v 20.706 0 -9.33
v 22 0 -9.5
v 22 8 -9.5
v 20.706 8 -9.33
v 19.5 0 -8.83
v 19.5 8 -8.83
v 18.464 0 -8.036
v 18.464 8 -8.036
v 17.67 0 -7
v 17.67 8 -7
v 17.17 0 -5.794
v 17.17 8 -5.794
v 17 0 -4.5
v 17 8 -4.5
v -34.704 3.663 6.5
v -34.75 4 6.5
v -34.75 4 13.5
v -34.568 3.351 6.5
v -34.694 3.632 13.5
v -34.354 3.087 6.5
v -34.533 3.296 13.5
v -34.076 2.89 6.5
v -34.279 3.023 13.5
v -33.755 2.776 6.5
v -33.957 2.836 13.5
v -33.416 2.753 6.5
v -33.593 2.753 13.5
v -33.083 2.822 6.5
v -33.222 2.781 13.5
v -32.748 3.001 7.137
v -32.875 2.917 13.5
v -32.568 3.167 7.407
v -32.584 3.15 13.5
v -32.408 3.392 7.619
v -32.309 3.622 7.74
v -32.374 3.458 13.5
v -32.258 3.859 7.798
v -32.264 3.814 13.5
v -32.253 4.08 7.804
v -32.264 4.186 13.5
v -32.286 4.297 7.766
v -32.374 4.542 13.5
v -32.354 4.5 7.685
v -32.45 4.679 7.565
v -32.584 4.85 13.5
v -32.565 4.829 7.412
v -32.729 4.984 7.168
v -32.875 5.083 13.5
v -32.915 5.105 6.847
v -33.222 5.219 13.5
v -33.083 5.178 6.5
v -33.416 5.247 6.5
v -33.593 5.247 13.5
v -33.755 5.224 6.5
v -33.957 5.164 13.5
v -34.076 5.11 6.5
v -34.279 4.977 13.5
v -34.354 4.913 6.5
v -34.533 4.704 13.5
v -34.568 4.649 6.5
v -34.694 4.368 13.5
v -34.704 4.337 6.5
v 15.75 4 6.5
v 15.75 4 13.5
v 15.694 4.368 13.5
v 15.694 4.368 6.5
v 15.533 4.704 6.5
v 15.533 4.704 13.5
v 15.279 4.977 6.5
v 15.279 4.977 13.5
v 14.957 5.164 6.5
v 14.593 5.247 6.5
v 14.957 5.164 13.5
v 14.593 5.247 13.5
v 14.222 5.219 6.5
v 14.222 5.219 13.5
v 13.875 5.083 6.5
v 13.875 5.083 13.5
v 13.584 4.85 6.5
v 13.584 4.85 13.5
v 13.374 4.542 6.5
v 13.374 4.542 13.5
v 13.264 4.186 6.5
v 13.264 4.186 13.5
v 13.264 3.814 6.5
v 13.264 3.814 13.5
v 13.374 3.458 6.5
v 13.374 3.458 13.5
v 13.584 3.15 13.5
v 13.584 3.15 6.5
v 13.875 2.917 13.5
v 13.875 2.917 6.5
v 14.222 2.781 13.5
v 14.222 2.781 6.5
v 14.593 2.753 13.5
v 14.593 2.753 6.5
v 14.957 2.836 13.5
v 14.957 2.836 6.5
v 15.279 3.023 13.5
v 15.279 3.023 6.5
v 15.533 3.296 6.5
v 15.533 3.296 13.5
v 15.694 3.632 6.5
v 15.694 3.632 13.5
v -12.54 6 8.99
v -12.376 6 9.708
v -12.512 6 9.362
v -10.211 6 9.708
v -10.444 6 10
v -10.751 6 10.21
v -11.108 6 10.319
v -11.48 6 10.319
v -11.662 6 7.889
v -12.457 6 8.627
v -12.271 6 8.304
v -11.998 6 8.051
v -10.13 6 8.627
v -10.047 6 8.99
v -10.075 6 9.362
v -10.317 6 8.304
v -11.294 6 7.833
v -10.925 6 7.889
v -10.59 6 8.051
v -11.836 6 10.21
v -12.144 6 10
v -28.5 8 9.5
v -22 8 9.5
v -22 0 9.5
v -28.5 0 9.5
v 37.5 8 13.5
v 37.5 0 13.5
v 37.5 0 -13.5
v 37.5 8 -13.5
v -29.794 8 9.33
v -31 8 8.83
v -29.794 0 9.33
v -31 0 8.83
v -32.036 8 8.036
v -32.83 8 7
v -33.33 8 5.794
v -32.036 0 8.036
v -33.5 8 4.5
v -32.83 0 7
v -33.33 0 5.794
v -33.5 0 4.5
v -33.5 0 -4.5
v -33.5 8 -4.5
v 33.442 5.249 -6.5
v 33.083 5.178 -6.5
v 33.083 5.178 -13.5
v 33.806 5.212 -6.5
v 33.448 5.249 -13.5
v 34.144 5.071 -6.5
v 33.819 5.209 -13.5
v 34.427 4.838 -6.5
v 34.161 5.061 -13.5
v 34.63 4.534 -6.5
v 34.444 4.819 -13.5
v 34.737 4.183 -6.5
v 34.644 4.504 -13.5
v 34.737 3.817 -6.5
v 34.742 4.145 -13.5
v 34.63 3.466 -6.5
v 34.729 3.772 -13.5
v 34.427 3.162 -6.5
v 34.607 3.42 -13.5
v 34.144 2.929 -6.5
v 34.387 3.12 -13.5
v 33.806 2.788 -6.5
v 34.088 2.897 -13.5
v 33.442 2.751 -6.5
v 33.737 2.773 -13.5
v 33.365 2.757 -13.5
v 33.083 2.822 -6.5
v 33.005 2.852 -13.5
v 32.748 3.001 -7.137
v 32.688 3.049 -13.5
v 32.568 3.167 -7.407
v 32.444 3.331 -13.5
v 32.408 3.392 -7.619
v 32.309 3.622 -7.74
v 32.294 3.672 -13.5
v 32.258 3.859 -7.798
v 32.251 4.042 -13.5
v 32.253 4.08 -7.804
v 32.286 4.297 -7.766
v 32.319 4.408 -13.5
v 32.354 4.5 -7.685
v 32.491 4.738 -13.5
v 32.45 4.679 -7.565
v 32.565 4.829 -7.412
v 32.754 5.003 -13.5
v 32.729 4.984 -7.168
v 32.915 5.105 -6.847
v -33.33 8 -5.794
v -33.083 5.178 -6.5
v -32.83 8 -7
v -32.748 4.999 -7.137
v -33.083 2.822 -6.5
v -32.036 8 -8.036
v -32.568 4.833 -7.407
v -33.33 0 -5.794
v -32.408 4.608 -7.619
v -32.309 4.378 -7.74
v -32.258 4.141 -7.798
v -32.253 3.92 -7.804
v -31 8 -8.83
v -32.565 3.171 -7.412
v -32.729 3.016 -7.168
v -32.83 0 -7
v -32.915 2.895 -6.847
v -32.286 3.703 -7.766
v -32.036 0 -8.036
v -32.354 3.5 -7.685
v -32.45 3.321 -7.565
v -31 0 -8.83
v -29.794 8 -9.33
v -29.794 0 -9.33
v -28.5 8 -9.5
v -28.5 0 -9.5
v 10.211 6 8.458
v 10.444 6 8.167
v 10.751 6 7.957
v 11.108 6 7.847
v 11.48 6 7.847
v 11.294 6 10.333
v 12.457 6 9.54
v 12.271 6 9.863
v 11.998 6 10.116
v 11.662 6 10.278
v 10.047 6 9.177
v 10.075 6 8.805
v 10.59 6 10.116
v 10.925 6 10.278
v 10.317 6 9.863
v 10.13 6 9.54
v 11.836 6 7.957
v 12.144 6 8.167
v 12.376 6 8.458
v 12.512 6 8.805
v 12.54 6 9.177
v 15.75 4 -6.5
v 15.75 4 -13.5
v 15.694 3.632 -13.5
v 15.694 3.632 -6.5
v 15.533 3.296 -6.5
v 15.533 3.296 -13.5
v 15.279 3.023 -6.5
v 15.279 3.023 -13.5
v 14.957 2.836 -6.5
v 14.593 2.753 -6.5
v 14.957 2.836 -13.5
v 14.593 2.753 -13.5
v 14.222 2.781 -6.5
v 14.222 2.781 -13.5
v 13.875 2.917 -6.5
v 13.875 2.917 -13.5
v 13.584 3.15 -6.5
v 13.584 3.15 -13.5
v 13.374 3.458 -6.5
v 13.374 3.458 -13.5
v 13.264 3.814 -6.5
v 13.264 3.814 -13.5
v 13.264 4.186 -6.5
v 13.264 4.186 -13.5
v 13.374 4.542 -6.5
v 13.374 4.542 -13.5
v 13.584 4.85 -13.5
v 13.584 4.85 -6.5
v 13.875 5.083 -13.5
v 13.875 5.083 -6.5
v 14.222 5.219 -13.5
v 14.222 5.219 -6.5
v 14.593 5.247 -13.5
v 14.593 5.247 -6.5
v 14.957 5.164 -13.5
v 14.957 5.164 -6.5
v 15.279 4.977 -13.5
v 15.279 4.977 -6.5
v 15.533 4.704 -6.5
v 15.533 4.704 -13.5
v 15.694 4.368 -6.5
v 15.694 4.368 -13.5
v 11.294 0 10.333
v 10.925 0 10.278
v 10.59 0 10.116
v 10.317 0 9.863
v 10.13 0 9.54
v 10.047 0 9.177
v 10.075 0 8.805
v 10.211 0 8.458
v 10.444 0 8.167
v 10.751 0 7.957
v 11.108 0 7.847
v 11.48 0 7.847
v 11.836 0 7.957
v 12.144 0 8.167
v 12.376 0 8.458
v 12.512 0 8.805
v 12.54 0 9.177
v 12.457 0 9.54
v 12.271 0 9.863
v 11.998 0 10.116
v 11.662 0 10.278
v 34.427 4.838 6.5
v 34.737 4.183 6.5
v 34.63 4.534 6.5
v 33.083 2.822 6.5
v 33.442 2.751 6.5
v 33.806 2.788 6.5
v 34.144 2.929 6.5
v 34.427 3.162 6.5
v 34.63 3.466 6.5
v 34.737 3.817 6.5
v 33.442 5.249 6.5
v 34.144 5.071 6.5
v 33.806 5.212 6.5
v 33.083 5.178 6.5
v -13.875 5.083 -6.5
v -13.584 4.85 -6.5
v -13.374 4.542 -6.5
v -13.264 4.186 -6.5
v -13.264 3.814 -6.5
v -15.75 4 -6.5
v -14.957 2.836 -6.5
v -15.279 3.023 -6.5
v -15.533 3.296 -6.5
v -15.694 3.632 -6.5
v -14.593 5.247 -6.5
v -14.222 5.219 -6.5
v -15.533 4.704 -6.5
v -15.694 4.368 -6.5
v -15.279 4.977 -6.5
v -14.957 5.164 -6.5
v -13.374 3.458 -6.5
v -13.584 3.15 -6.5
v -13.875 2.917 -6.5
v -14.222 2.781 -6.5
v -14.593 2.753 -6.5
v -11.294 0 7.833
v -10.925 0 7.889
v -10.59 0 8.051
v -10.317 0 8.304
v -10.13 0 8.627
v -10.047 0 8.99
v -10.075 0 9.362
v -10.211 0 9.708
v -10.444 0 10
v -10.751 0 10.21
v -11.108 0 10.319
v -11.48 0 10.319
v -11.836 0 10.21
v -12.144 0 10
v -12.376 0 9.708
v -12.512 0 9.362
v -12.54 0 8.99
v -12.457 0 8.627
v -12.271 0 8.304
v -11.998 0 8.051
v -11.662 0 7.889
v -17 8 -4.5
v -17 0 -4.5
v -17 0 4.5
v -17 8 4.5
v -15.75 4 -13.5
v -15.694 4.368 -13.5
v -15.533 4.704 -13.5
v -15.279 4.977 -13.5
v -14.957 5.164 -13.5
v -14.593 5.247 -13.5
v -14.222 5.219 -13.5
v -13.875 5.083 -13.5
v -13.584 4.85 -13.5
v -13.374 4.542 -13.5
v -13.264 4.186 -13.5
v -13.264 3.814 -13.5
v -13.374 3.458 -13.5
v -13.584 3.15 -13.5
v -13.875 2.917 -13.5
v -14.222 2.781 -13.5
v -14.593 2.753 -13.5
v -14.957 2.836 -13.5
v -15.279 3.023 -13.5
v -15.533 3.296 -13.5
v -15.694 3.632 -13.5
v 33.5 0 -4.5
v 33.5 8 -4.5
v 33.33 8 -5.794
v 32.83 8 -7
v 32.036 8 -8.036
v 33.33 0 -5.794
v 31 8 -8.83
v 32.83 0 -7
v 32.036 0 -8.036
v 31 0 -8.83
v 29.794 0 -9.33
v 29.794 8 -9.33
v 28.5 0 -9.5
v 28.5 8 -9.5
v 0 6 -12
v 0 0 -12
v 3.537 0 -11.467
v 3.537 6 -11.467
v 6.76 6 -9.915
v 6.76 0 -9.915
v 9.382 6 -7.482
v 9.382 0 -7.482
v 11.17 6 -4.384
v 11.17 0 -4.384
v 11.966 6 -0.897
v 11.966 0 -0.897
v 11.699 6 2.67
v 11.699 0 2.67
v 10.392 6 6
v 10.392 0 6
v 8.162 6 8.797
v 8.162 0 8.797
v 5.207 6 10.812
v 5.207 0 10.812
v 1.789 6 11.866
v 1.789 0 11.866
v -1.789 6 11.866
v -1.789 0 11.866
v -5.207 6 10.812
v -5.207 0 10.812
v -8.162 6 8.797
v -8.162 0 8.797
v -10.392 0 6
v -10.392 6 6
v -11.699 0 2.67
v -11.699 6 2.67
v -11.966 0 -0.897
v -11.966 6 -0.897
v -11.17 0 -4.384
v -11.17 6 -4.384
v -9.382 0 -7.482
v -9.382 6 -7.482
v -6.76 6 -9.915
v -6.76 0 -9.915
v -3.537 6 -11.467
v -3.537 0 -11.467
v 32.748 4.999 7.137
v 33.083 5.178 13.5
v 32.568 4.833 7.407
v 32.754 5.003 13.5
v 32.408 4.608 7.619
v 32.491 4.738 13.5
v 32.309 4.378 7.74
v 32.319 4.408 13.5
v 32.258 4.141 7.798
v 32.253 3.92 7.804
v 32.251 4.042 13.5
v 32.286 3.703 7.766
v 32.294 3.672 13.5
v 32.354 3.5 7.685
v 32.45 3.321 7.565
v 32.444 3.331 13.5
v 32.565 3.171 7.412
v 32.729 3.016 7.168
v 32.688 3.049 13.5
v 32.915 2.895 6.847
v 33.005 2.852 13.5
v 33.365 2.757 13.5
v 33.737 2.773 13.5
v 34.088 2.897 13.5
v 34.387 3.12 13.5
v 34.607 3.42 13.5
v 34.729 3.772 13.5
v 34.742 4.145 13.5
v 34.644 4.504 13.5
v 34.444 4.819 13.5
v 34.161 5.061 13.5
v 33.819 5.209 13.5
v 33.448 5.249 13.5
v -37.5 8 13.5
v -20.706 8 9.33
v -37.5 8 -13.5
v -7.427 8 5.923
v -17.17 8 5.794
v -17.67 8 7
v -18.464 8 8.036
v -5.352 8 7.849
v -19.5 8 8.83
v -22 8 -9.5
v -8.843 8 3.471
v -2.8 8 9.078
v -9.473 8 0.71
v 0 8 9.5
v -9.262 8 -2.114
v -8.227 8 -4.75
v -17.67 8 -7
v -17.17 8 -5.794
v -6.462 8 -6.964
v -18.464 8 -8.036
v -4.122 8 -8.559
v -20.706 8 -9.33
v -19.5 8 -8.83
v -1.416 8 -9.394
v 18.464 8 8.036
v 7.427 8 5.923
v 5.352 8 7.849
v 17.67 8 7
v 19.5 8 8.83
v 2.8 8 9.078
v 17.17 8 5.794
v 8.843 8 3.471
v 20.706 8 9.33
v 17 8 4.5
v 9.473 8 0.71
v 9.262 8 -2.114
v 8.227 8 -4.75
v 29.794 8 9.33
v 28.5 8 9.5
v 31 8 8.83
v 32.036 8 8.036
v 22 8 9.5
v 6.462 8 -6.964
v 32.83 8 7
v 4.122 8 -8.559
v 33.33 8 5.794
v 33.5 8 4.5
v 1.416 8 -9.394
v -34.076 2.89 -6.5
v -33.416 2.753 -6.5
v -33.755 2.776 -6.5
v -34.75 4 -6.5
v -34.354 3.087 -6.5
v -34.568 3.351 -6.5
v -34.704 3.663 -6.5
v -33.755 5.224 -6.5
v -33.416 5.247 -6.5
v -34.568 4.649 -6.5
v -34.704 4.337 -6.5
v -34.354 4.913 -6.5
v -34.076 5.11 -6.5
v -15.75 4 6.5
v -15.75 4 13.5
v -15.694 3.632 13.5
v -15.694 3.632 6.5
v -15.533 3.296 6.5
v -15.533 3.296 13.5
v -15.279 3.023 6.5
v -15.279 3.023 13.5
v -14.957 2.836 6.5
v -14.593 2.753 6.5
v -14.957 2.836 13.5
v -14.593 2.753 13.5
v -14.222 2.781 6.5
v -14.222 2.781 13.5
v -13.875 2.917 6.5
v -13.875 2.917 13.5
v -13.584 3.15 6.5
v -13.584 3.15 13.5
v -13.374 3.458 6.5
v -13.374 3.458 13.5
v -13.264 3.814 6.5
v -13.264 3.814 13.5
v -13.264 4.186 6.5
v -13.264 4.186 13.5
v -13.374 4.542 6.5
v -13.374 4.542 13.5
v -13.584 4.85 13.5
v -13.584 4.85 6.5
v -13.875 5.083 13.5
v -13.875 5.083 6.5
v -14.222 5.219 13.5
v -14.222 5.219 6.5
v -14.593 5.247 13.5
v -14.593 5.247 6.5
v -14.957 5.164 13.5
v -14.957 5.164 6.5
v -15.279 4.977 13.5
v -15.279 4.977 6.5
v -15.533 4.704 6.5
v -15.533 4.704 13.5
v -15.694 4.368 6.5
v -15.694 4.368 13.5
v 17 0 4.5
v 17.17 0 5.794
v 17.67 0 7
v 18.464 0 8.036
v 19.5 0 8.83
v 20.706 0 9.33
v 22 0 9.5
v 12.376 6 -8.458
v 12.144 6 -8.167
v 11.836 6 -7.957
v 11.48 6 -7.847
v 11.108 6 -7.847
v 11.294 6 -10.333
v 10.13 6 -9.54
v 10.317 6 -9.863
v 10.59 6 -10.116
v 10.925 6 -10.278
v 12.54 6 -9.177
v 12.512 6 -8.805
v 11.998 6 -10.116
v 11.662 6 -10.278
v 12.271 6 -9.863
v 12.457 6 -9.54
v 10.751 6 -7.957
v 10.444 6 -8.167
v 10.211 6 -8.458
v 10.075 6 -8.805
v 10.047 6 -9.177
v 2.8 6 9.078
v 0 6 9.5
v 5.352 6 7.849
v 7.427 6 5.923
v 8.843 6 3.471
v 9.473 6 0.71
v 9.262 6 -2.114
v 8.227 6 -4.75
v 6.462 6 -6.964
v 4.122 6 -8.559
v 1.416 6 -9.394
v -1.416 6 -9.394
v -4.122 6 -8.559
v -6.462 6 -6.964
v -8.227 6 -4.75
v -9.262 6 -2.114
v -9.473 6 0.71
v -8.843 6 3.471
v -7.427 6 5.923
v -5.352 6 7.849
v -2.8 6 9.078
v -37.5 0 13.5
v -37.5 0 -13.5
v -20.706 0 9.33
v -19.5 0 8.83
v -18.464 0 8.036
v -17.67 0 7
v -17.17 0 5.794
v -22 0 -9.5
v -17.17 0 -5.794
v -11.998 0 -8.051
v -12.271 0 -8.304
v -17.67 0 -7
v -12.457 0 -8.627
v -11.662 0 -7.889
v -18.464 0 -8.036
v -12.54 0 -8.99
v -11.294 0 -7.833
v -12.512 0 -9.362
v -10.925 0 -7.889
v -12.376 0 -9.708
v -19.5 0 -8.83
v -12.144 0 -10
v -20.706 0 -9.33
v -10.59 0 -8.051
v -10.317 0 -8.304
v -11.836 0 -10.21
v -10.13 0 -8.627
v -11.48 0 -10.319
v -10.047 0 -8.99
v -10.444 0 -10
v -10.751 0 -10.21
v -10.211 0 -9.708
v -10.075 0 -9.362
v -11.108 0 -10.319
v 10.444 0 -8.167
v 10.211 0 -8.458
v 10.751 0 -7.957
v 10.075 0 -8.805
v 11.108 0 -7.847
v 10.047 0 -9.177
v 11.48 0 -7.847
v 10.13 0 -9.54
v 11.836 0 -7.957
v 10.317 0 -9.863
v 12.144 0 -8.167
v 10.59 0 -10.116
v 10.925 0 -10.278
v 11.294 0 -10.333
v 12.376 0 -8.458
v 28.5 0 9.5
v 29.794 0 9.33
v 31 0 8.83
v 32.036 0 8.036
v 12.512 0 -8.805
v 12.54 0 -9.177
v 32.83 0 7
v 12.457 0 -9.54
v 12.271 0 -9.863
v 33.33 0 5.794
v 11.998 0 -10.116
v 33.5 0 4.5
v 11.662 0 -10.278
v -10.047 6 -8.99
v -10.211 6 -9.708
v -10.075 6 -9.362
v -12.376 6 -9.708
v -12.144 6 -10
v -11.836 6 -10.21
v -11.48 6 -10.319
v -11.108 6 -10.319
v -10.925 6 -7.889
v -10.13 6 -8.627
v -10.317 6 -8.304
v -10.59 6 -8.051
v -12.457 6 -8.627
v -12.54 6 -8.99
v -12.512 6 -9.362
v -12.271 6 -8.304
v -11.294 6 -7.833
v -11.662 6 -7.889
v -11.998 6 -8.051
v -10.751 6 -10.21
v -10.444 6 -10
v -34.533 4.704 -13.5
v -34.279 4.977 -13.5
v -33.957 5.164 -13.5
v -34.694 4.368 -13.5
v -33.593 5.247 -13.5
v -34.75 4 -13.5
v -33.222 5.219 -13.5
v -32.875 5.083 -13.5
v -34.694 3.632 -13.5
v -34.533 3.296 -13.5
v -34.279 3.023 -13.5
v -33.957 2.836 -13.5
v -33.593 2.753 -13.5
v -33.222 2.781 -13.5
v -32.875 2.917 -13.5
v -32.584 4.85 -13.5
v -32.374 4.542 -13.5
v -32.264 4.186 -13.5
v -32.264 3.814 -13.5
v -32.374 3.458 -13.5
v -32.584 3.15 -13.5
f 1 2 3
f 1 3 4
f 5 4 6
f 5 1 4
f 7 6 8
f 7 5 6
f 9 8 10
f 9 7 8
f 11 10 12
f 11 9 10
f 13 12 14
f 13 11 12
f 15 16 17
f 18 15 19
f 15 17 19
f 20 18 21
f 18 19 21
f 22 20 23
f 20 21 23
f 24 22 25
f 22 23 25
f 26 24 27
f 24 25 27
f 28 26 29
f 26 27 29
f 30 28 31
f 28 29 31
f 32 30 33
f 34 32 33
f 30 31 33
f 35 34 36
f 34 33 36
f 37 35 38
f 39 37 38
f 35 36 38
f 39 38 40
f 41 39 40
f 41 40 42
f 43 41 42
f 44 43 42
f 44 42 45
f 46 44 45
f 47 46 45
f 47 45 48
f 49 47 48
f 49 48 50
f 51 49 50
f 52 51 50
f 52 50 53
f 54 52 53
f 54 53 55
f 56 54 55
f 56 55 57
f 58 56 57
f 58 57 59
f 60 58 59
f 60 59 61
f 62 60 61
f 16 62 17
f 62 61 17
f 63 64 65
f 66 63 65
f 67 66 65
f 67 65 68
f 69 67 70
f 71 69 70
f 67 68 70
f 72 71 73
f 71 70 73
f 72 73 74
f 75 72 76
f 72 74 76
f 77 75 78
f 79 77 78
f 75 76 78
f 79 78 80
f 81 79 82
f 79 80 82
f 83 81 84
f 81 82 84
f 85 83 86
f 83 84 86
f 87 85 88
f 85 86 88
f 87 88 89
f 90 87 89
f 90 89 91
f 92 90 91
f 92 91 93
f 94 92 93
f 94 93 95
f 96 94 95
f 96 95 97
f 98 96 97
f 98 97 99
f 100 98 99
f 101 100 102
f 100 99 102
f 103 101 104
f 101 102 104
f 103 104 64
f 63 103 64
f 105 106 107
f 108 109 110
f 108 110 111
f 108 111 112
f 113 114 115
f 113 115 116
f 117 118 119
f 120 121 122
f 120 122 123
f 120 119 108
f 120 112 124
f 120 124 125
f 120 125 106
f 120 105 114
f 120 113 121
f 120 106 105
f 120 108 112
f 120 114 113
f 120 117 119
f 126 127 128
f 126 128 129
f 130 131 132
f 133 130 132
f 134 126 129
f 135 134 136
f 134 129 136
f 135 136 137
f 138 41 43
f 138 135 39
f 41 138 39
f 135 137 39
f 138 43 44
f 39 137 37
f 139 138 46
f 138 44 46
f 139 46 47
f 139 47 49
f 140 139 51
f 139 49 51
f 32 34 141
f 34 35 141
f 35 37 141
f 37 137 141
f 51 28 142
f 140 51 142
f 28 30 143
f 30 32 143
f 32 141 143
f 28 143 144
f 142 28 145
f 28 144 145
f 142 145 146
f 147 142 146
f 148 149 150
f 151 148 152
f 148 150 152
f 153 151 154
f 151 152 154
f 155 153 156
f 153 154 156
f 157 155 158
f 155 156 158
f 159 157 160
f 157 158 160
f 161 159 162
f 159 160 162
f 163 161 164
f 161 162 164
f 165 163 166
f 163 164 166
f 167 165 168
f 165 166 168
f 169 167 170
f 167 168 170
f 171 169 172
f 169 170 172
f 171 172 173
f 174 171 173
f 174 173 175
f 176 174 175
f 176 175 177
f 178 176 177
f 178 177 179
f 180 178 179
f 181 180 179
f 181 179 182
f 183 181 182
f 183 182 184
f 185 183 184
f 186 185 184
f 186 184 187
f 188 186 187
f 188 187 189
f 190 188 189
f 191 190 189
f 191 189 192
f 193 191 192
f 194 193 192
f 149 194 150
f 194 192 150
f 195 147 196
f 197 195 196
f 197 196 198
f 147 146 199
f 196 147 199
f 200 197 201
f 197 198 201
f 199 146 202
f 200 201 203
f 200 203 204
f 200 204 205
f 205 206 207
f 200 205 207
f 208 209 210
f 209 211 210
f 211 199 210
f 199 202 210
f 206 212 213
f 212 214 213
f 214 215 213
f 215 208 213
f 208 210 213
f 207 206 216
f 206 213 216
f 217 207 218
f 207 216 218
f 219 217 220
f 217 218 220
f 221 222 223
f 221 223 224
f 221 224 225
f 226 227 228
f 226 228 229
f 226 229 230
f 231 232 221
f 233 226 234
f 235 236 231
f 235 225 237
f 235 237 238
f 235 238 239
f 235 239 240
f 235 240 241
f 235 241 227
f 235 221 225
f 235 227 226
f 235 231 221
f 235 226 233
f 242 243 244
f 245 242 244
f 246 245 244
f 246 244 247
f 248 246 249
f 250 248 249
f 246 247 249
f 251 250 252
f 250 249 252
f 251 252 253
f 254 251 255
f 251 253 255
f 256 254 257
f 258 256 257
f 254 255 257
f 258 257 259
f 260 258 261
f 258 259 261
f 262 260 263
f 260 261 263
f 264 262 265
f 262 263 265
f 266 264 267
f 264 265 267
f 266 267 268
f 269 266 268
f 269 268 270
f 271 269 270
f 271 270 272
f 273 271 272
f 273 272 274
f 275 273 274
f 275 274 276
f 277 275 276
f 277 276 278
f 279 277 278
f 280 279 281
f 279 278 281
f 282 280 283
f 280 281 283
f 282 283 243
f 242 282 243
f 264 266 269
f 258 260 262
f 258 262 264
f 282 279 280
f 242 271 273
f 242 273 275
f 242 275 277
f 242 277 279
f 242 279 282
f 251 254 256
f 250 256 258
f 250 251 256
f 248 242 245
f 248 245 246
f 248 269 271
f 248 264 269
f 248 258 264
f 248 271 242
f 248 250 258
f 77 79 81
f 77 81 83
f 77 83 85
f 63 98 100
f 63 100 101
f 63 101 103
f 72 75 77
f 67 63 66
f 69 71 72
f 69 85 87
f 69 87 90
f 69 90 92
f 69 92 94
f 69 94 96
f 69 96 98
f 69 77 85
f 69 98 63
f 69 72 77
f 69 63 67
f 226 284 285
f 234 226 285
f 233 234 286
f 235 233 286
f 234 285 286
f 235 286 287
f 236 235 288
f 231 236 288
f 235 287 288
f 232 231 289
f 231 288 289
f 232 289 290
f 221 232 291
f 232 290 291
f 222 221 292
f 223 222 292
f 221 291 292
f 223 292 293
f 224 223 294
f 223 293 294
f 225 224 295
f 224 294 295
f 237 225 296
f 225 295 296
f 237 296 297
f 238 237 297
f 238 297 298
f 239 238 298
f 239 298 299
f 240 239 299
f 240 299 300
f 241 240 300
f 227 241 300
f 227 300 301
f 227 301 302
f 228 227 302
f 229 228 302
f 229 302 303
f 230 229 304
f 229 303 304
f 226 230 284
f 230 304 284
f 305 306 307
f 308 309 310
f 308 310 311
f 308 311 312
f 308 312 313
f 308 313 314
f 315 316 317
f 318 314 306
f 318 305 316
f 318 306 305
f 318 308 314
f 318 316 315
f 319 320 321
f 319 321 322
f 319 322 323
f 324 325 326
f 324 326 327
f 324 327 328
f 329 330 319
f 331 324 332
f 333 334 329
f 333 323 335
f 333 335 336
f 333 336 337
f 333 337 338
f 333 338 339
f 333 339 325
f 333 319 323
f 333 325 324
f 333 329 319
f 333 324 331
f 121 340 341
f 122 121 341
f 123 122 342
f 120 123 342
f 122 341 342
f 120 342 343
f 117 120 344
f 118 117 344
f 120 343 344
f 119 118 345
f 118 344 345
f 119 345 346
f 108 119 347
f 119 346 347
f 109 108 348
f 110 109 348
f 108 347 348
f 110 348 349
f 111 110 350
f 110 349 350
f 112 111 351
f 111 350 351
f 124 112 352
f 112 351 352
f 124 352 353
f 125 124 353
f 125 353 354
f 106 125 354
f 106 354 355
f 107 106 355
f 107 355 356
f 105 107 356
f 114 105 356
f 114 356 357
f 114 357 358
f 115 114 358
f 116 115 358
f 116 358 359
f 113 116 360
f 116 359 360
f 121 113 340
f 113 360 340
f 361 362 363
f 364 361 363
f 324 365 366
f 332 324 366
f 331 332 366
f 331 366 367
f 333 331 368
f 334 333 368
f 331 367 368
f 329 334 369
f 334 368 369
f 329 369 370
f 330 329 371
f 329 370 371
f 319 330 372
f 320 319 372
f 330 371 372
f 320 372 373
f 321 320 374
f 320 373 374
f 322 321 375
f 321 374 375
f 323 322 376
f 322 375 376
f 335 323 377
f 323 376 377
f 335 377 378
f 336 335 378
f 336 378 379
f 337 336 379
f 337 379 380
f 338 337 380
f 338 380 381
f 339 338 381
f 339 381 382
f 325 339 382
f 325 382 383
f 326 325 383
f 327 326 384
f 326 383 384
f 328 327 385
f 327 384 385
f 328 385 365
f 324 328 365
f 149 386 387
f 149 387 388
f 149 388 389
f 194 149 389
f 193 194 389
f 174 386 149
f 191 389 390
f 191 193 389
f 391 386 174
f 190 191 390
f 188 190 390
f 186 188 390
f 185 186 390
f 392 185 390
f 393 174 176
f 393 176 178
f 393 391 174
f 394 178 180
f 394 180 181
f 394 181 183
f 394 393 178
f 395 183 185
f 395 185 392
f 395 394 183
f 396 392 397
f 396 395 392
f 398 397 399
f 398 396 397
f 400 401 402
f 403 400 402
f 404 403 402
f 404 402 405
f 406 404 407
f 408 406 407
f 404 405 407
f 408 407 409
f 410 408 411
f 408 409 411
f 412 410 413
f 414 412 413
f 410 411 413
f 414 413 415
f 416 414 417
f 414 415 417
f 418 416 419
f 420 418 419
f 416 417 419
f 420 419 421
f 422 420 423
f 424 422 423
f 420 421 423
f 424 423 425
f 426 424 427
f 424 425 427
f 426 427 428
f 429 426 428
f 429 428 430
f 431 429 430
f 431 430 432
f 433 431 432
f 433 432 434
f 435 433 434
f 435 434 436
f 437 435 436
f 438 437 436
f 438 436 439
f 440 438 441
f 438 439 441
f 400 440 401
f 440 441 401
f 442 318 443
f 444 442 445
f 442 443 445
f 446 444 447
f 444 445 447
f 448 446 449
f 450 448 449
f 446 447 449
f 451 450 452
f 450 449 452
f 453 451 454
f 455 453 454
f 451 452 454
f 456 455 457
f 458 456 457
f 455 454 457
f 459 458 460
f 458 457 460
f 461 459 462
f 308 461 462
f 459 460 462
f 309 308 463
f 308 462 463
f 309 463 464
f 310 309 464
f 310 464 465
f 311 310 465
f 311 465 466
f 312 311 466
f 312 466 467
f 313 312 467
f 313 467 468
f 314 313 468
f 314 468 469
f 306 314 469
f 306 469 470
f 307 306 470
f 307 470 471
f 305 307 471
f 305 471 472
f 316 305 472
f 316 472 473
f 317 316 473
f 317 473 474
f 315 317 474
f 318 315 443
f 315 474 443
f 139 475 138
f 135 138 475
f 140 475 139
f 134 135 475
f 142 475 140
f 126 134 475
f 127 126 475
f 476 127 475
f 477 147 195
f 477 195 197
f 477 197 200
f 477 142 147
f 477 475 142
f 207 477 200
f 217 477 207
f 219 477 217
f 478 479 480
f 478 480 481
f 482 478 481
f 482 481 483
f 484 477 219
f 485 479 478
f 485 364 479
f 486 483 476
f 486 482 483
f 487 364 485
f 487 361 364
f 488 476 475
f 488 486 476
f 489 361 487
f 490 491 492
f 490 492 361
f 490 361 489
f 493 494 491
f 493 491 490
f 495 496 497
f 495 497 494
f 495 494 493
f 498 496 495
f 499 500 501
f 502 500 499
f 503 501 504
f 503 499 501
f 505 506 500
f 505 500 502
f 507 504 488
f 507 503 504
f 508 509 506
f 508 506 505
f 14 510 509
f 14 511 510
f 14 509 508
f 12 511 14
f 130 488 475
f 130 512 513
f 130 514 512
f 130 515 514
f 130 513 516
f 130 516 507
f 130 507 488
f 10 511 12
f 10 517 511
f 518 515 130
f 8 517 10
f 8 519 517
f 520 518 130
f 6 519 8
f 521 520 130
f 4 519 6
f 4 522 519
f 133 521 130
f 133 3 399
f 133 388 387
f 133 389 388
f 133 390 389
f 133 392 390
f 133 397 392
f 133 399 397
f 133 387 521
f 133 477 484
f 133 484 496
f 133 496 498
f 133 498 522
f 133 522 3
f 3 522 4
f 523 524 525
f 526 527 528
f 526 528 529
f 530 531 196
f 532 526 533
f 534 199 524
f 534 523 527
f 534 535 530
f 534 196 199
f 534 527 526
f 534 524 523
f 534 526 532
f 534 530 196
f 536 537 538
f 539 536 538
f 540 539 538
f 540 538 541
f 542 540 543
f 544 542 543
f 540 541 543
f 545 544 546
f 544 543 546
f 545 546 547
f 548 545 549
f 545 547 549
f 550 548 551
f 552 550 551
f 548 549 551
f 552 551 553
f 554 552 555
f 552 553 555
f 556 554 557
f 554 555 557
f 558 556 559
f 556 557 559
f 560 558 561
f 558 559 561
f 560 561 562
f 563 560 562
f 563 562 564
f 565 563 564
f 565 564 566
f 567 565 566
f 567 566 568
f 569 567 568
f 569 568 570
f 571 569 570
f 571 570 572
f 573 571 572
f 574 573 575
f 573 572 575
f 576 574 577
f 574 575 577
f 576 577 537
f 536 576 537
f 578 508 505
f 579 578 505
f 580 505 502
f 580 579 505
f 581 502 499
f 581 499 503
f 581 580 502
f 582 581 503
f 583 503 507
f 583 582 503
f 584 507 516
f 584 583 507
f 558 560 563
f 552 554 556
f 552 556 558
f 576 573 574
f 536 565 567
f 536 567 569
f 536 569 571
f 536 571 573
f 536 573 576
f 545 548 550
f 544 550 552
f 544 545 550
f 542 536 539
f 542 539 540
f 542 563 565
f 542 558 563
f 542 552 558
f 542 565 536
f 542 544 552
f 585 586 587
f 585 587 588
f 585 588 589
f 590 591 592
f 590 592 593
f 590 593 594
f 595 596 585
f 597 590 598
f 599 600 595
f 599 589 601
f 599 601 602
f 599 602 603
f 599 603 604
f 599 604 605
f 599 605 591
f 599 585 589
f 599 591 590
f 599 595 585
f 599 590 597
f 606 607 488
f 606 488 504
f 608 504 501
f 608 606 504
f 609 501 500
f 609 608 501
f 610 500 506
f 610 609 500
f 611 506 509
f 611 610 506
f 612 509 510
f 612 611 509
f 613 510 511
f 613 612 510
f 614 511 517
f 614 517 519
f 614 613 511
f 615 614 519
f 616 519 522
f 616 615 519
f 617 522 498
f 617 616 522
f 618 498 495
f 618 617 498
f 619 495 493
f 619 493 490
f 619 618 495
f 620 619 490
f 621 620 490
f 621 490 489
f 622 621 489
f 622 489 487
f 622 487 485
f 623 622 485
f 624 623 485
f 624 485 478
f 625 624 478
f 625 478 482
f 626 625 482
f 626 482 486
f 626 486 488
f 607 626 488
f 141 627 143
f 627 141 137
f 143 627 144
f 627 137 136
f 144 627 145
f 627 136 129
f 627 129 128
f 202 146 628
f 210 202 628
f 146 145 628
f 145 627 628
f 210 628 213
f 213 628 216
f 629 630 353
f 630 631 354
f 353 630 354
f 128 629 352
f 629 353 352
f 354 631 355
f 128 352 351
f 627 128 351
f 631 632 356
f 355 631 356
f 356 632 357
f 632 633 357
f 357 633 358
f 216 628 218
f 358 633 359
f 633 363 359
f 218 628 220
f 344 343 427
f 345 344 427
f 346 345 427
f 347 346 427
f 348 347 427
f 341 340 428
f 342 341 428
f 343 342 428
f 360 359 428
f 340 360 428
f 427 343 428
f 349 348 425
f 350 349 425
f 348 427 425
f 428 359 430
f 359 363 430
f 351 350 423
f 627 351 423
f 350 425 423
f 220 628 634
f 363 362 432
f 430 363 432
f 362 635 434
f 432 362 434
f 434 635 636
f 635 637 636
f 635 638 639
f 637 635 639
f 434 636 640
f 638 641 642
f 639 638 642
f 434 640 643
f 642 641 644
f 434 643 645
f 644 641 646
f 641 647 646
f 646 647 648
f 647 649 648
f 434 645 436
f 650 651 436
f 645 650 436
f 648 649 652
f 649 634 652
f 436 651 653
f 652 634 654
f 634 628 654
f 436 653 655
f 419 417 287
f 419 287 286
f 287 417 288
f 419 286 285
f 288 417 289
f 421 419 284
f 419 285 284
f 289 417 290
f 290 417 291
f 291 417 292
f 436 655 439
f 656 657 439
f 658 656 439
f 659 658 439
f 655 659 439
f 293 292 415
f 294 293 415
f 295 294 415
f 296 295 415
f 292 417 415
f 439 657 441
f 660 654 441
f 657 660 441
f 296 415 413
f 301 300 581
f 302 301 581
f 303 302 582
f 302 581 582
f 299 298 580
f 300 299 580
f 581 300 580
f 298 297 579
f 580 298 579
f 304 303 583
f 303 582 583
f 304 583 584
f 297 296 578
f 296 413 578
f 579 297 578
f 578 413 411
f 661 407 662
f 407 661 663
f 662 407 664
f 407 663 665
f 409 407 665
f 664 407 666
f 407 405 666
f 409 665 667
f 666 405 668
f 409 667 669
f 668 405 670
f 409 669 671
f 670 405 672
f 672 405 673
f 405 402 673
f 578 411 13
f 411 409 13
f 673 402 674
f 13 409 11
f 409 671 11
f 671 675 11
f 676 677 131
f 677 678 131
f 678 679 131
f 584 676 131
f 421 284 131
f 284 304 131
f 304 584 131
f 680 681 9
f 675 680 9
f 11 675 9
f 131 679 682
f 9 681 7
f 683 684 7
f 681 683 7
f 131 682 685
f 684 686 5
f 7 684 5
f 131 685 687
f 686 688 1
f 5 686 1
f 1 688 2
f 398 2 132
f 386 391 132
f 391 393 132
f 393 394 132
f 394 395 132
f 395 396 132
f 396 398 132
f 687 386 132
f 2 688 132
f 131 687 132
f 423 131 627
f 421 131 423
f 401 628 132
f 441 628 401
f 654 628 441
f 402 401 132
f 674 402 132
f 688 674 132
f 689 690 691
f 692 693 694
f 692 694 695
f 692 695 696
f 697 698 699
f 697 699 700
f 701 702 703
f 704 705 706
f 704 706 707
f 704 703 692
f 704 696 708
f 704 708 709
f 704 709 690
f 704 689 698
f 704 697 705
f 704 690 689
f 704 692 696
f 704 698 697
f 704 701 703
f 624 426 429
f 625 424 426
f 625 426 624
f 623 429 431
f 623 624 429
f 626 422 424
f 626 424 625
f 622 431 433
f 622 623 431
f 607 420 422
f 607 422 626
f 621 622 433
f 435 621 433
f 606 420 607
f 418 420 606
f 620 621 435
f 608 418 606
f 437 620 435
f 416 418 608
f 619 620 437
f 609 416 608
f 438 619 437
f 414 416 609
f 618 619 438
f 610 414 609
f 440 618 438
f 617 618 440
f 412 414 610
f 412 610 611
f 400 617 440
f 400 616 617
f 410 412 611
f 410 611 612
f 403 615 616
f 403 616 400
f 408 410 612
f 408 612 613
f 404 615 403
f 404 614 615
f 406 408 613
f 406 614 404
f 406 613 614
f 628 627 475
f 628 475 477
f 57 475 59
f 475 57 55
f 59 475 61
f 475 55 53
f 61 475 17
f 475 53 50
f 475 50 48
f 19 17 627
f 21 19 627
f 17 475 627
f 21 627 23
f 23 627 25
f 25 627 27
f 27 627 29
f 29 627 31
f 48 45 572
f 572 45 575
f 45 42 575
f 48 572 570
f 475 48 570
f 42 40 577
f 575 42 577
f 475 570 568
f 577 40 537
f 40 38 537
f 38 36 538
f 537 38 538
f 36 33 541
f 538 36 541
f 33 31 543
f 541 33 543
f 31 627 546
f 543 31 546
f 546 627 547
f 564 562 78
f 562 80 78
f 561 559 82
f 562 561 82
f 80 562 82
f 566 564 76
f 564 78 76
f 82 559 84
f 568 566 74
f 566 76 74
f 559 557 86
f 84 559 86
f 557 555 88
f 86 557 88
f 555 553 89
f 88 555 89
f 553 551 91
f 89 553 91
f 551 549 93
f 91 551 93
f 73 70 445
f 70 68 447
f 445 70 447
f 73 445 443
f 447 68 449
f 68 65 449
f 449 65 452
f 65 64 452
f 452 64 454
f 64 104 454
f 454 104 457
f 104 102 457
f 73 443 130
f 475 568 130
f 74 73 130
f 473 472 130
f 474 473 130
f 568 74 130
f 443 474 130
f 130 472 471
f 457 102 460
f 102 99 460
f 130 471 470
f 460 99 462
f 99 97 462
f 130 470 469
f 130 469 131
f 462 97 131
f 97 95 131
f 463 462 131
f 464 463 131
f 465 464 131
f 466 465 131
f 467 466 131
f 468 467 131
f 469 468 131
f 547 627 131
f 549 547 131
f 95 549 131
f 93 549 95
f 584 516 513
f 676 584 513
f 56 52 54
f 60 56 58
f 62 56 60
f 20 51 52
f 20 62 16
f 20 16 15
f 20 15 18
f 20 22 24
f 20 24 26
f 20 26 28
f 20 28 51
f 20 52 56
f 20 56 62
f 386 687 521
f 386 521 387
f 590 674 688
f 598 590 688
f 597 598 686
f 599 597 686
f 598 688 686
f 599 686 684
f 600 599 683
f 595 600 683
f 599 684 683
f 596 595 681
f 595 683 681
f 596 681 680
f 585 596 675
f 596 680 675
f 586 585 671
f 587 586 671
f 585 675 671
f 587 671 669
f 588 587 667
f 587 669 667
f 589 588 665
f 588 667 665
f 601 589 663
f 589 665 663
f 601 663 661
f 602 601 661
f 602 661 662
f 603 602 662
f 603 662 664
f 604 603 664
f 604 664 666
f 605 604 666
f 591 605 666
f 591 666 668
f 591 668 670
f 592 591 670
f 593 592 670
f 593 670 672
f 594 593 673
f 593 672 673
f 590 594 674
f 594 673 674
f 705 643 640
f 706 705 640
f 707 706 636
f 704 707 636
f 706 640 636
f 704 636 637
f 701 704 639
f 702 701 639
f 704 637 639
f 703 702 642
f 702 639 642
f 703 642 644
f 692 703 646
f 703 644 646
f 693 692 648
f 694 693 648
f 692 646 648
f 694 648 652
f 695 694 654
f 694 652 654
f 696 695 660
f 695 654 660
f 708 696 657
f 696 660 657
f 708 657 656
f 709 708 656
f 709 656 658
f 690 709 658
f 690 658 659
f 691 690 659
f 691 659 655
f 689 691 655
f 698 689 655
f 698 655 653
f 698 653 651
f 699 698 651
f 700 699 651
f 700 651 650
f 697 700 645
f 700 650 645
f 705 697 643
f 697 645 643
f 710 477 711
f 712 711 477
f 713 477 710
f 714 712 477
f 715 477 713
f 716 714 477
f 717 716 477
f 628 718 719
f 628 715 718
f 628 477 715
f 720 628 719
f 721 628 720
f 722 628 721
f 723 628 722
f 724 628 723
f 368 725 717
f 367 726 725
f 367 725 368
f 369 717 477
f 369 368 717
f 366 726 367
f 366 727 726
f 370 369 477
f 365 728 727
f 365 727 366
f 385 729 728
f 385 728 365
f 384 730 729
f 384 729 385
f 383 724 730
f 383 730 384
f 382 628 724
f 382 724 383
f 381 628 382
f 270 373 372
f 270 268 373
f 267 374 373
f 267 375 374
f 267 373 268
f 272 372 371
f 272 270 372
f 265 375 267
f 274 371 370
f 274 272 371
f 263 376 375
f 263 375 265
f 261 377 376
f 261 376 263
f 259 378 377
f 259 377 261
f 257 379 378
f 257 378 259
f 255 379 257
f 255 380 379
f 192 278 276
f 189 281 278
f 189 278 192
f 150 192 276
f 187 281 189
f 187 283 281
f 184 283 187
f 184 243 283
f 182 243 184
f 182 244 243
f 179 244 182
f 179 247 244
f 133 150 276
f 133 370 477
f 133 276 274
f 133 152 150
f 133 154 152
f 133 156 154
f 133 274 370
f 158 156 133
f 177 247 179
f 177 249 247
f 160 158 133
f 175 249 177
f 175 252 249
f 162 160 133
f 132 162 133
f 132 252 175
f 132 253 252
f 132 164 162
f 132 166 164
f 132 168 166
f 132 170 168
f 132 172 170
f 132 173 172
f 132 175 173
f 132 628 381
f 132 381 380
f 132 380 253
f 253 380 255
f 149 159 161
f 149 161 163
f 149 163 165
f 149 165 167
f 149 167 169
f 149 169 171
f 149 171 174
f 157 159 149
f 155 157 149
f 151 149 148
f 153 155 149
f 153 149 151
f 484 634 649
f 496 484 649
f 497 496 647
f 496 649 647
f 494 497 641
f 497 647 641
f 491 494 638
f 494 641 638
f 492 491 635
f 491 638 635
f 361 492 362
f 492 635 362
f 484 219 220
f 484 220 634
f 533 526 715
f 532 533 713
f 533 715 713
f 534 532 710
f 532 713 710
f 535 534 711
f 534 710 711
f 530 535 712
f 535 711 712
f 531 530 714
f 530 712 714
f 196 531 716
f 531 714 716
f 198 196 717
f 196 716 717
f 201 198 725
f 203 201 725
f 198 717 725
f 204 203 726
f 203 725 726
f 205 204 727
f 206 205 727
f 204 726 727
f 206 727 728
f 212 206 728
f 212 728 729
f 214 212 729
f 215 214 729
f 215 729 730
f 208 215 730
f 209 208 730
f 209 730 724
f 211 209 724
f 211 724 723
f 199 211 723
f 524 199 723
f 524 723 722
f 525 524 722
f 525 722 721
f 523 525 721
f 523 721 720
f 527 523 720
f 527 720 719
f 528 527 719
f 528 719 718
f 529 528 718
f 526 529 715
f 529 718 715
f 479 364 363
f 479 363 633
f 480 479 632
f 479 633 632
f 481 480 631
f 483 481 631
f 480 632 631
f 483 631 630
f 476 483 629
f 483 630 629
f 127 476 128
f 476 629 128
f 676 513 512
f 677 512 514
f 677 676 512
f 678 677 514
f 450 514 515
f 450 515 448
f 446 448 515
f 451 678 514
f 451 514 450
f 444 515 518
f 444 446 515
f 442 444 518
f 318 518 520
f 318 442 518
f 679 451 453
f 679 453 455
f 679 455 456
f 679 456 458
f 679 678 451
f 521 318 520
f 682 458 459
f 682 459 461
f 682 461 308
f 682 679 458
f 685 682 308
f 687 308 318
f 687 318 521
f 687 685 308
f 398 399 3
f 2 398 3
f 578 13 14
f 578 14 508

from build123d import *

# Parameters (mm, degrees)
SKETCH_1_W           = 75
SKETCH_1_H           = 27
SKETCH_1_R           = 9.5
EXTRUDE_1_DEPTH      = 8
SKETCH_9_R           = 12
CUT_EXTRUDE_7_DEPTH  = 6
SKETCH_11_R          = 1.25
CUT_EXTRUDE_8_DEPTH  = 7
SKETCH_12_R          = 1.25
CUT_EXTRUDE_9_DEPTH  = 7
SKETCH_13_R          = 1.25
CUT_EXTRUDE_10_DEPTH = 6


with BuildPart() as part:
    # Эскиз1 → Бобышка-Вытянуть1 (new body)
    with BuildSketch(Plane(origin=(0, 0, 0), x_dir=(1, 0, 0), z_dir=(0, 1, 0))):
        Rectangle(SKETCH_1_W, SKETCH_1_H)
        with Locations(Location((0, 0, 0), (0, 0, 270))):  # turned: the seam where the file's is
            Circle(SKETCH_1_R, mode=Mode.SUBTRACT)
        with BuildLine():
            Line((-28.5, 9.5), (-22, 9.5))
            ThreePointArc((-22, 9.5), (-18.464466094, 8.035533906), (-17, 4.5))
            Line((-17, 4.5), (-17, -4.5))
            ThreePointArc((-17, -4.5), (-18.464466094, -8.035533906), (-22, -9.5))
            Line((-22, -9.5), (-28.5, -9.5))
            ThreePointArc((-28.5, -9.5), (-32.035533906, -8.035533906), (-33.5, -4.5))
            Line((-33.5, -4.5), (-33.5, 4.5))
            ThreePointArc((-33.5, 4.5), (-32.035533906, 8.035533906), (-28.5, 9.5))
        make_face(mode=Mode.SUBTRACT)
        with BuildLine():
            Line((28.5, 9.5), (22, 9.5))
            ThreePointArc((22, 9.5), (18.464466094, 8.035533906), (17, 4.5))
            Line((17, 4.5), (17, -4.5))
            ThreePointArc((17, -4.5), (18.464466094, -8.035533906), (22, -9.5))
            Line((22, -9.5), (28.5, -9.5))
            ThreePointArc((28.5, -9.5), (32.035533906, -8.035533906), (33.5, -4.5))
            Line((33.5, -4.5), (33.5, 4.5))
            ThreePointArc((33.5, 4.5), (32.035533906, 8.035533906), (28.5, 9.5))
        make_face(mode=Mode.SUBTRACT)
    extrude(amount=EXTRUDE_1_DEPTH)

    # Эскиз9 → Вырез-Вытянуть7 (cut)
    with BuildSketch(Plane.XZ):
        with Locations(Location((0, 0, 0), (0, 0, 270))):  # turned: the seam where the file's is
            Circle(SKETCH_9_R)
    extrude(amount=-CUT_EXTRUDE_7_DEPTH, mode=Mode.SUBTRACT)

    # Эскиз11 → Вырез-Вытянуть8 (cut)
    with BuildSketch(Plane(origin=(0, 0, -13.5), x_dir=(-1, 0, 0), z_dir=(0, 0, -1))):
        with Locations((14.5, 4)):
            Circle(SKETCH_11_R)
        with Locations((33.5, 4)):
            Circle(SKETCH_11_R)
        with Locations(Location((-33.5, 4, 0), (0, 0, 70.49194101))):  # turned: the seam where the file's is
            Circle(SKETCH_11_R)
        with Locations(Location((-14.5, 4, 0), (0, 0, 180))):  # turned: the seam where the file's is
            Circle(SKETCH_11_R)
    extrude(amount=-CUT_EXTRUDE_8_DEPTH, mode=Mode.SUBTRACT)

    # Эскиз12 → Вырез-Вытянуть9 (cut)
    with BuildSketch(Plane.XY.offset(13.5)):
        with Locations(Location((-14.5, 4, 0), (0, 0, 180))):  # turned: the seam where the file's is
            Circle(SKETCH_12_R)
        with Locations(Location((-33.5, 4, 0), (0, 0, 180))):  # turned: the seam where the file's is
            Circle(SKETCH_12_R)
        with Locations((14.5, 4)):
            Circle(SKETCH_12_R)
        with Locations(Location((33.5, 4, 0), (0, 0, 109.50805899))):  # turned: the seam where the file's is
            Circle(SKETCH_12_R)
    extrude(amount=-CUT_EXTRUDE_9_DEPTH, mode=Mode.SUBTRACT)

    # Эскиз13 → Вырез-Вытянуть10 (cut)
    with BuildSketch(Plane.XZ):
        with Locations(Location((-11.29380733, 9.083435331, 0), (0, 0, 270))):  # turned: the seam where the file's is
            Circle(SKETCH_13_R)
        with Locations(Location((11.29380733, 9.083435331, 0), (0, 0, 90))):  # turned: the seam where the file's is
            Circle(SKETCH_13_R)
        with Locations(Location((11.29380733, -9.083435331, 0), (0, 0, 270))):  # turned: the seam where the file's is
            Circle(SKETCH_13_R)
        with Locations(Location((-11.29380733, -9.083435331, 0), (0, 0, 90))):  # turned: the seam where the file's is
            Circle(SKETCH_13_R)
    extrude(amount=-CUT_EXTRUDE_10_DEPTH, mode=Mode.SUBTRACT)


solid = part.part
